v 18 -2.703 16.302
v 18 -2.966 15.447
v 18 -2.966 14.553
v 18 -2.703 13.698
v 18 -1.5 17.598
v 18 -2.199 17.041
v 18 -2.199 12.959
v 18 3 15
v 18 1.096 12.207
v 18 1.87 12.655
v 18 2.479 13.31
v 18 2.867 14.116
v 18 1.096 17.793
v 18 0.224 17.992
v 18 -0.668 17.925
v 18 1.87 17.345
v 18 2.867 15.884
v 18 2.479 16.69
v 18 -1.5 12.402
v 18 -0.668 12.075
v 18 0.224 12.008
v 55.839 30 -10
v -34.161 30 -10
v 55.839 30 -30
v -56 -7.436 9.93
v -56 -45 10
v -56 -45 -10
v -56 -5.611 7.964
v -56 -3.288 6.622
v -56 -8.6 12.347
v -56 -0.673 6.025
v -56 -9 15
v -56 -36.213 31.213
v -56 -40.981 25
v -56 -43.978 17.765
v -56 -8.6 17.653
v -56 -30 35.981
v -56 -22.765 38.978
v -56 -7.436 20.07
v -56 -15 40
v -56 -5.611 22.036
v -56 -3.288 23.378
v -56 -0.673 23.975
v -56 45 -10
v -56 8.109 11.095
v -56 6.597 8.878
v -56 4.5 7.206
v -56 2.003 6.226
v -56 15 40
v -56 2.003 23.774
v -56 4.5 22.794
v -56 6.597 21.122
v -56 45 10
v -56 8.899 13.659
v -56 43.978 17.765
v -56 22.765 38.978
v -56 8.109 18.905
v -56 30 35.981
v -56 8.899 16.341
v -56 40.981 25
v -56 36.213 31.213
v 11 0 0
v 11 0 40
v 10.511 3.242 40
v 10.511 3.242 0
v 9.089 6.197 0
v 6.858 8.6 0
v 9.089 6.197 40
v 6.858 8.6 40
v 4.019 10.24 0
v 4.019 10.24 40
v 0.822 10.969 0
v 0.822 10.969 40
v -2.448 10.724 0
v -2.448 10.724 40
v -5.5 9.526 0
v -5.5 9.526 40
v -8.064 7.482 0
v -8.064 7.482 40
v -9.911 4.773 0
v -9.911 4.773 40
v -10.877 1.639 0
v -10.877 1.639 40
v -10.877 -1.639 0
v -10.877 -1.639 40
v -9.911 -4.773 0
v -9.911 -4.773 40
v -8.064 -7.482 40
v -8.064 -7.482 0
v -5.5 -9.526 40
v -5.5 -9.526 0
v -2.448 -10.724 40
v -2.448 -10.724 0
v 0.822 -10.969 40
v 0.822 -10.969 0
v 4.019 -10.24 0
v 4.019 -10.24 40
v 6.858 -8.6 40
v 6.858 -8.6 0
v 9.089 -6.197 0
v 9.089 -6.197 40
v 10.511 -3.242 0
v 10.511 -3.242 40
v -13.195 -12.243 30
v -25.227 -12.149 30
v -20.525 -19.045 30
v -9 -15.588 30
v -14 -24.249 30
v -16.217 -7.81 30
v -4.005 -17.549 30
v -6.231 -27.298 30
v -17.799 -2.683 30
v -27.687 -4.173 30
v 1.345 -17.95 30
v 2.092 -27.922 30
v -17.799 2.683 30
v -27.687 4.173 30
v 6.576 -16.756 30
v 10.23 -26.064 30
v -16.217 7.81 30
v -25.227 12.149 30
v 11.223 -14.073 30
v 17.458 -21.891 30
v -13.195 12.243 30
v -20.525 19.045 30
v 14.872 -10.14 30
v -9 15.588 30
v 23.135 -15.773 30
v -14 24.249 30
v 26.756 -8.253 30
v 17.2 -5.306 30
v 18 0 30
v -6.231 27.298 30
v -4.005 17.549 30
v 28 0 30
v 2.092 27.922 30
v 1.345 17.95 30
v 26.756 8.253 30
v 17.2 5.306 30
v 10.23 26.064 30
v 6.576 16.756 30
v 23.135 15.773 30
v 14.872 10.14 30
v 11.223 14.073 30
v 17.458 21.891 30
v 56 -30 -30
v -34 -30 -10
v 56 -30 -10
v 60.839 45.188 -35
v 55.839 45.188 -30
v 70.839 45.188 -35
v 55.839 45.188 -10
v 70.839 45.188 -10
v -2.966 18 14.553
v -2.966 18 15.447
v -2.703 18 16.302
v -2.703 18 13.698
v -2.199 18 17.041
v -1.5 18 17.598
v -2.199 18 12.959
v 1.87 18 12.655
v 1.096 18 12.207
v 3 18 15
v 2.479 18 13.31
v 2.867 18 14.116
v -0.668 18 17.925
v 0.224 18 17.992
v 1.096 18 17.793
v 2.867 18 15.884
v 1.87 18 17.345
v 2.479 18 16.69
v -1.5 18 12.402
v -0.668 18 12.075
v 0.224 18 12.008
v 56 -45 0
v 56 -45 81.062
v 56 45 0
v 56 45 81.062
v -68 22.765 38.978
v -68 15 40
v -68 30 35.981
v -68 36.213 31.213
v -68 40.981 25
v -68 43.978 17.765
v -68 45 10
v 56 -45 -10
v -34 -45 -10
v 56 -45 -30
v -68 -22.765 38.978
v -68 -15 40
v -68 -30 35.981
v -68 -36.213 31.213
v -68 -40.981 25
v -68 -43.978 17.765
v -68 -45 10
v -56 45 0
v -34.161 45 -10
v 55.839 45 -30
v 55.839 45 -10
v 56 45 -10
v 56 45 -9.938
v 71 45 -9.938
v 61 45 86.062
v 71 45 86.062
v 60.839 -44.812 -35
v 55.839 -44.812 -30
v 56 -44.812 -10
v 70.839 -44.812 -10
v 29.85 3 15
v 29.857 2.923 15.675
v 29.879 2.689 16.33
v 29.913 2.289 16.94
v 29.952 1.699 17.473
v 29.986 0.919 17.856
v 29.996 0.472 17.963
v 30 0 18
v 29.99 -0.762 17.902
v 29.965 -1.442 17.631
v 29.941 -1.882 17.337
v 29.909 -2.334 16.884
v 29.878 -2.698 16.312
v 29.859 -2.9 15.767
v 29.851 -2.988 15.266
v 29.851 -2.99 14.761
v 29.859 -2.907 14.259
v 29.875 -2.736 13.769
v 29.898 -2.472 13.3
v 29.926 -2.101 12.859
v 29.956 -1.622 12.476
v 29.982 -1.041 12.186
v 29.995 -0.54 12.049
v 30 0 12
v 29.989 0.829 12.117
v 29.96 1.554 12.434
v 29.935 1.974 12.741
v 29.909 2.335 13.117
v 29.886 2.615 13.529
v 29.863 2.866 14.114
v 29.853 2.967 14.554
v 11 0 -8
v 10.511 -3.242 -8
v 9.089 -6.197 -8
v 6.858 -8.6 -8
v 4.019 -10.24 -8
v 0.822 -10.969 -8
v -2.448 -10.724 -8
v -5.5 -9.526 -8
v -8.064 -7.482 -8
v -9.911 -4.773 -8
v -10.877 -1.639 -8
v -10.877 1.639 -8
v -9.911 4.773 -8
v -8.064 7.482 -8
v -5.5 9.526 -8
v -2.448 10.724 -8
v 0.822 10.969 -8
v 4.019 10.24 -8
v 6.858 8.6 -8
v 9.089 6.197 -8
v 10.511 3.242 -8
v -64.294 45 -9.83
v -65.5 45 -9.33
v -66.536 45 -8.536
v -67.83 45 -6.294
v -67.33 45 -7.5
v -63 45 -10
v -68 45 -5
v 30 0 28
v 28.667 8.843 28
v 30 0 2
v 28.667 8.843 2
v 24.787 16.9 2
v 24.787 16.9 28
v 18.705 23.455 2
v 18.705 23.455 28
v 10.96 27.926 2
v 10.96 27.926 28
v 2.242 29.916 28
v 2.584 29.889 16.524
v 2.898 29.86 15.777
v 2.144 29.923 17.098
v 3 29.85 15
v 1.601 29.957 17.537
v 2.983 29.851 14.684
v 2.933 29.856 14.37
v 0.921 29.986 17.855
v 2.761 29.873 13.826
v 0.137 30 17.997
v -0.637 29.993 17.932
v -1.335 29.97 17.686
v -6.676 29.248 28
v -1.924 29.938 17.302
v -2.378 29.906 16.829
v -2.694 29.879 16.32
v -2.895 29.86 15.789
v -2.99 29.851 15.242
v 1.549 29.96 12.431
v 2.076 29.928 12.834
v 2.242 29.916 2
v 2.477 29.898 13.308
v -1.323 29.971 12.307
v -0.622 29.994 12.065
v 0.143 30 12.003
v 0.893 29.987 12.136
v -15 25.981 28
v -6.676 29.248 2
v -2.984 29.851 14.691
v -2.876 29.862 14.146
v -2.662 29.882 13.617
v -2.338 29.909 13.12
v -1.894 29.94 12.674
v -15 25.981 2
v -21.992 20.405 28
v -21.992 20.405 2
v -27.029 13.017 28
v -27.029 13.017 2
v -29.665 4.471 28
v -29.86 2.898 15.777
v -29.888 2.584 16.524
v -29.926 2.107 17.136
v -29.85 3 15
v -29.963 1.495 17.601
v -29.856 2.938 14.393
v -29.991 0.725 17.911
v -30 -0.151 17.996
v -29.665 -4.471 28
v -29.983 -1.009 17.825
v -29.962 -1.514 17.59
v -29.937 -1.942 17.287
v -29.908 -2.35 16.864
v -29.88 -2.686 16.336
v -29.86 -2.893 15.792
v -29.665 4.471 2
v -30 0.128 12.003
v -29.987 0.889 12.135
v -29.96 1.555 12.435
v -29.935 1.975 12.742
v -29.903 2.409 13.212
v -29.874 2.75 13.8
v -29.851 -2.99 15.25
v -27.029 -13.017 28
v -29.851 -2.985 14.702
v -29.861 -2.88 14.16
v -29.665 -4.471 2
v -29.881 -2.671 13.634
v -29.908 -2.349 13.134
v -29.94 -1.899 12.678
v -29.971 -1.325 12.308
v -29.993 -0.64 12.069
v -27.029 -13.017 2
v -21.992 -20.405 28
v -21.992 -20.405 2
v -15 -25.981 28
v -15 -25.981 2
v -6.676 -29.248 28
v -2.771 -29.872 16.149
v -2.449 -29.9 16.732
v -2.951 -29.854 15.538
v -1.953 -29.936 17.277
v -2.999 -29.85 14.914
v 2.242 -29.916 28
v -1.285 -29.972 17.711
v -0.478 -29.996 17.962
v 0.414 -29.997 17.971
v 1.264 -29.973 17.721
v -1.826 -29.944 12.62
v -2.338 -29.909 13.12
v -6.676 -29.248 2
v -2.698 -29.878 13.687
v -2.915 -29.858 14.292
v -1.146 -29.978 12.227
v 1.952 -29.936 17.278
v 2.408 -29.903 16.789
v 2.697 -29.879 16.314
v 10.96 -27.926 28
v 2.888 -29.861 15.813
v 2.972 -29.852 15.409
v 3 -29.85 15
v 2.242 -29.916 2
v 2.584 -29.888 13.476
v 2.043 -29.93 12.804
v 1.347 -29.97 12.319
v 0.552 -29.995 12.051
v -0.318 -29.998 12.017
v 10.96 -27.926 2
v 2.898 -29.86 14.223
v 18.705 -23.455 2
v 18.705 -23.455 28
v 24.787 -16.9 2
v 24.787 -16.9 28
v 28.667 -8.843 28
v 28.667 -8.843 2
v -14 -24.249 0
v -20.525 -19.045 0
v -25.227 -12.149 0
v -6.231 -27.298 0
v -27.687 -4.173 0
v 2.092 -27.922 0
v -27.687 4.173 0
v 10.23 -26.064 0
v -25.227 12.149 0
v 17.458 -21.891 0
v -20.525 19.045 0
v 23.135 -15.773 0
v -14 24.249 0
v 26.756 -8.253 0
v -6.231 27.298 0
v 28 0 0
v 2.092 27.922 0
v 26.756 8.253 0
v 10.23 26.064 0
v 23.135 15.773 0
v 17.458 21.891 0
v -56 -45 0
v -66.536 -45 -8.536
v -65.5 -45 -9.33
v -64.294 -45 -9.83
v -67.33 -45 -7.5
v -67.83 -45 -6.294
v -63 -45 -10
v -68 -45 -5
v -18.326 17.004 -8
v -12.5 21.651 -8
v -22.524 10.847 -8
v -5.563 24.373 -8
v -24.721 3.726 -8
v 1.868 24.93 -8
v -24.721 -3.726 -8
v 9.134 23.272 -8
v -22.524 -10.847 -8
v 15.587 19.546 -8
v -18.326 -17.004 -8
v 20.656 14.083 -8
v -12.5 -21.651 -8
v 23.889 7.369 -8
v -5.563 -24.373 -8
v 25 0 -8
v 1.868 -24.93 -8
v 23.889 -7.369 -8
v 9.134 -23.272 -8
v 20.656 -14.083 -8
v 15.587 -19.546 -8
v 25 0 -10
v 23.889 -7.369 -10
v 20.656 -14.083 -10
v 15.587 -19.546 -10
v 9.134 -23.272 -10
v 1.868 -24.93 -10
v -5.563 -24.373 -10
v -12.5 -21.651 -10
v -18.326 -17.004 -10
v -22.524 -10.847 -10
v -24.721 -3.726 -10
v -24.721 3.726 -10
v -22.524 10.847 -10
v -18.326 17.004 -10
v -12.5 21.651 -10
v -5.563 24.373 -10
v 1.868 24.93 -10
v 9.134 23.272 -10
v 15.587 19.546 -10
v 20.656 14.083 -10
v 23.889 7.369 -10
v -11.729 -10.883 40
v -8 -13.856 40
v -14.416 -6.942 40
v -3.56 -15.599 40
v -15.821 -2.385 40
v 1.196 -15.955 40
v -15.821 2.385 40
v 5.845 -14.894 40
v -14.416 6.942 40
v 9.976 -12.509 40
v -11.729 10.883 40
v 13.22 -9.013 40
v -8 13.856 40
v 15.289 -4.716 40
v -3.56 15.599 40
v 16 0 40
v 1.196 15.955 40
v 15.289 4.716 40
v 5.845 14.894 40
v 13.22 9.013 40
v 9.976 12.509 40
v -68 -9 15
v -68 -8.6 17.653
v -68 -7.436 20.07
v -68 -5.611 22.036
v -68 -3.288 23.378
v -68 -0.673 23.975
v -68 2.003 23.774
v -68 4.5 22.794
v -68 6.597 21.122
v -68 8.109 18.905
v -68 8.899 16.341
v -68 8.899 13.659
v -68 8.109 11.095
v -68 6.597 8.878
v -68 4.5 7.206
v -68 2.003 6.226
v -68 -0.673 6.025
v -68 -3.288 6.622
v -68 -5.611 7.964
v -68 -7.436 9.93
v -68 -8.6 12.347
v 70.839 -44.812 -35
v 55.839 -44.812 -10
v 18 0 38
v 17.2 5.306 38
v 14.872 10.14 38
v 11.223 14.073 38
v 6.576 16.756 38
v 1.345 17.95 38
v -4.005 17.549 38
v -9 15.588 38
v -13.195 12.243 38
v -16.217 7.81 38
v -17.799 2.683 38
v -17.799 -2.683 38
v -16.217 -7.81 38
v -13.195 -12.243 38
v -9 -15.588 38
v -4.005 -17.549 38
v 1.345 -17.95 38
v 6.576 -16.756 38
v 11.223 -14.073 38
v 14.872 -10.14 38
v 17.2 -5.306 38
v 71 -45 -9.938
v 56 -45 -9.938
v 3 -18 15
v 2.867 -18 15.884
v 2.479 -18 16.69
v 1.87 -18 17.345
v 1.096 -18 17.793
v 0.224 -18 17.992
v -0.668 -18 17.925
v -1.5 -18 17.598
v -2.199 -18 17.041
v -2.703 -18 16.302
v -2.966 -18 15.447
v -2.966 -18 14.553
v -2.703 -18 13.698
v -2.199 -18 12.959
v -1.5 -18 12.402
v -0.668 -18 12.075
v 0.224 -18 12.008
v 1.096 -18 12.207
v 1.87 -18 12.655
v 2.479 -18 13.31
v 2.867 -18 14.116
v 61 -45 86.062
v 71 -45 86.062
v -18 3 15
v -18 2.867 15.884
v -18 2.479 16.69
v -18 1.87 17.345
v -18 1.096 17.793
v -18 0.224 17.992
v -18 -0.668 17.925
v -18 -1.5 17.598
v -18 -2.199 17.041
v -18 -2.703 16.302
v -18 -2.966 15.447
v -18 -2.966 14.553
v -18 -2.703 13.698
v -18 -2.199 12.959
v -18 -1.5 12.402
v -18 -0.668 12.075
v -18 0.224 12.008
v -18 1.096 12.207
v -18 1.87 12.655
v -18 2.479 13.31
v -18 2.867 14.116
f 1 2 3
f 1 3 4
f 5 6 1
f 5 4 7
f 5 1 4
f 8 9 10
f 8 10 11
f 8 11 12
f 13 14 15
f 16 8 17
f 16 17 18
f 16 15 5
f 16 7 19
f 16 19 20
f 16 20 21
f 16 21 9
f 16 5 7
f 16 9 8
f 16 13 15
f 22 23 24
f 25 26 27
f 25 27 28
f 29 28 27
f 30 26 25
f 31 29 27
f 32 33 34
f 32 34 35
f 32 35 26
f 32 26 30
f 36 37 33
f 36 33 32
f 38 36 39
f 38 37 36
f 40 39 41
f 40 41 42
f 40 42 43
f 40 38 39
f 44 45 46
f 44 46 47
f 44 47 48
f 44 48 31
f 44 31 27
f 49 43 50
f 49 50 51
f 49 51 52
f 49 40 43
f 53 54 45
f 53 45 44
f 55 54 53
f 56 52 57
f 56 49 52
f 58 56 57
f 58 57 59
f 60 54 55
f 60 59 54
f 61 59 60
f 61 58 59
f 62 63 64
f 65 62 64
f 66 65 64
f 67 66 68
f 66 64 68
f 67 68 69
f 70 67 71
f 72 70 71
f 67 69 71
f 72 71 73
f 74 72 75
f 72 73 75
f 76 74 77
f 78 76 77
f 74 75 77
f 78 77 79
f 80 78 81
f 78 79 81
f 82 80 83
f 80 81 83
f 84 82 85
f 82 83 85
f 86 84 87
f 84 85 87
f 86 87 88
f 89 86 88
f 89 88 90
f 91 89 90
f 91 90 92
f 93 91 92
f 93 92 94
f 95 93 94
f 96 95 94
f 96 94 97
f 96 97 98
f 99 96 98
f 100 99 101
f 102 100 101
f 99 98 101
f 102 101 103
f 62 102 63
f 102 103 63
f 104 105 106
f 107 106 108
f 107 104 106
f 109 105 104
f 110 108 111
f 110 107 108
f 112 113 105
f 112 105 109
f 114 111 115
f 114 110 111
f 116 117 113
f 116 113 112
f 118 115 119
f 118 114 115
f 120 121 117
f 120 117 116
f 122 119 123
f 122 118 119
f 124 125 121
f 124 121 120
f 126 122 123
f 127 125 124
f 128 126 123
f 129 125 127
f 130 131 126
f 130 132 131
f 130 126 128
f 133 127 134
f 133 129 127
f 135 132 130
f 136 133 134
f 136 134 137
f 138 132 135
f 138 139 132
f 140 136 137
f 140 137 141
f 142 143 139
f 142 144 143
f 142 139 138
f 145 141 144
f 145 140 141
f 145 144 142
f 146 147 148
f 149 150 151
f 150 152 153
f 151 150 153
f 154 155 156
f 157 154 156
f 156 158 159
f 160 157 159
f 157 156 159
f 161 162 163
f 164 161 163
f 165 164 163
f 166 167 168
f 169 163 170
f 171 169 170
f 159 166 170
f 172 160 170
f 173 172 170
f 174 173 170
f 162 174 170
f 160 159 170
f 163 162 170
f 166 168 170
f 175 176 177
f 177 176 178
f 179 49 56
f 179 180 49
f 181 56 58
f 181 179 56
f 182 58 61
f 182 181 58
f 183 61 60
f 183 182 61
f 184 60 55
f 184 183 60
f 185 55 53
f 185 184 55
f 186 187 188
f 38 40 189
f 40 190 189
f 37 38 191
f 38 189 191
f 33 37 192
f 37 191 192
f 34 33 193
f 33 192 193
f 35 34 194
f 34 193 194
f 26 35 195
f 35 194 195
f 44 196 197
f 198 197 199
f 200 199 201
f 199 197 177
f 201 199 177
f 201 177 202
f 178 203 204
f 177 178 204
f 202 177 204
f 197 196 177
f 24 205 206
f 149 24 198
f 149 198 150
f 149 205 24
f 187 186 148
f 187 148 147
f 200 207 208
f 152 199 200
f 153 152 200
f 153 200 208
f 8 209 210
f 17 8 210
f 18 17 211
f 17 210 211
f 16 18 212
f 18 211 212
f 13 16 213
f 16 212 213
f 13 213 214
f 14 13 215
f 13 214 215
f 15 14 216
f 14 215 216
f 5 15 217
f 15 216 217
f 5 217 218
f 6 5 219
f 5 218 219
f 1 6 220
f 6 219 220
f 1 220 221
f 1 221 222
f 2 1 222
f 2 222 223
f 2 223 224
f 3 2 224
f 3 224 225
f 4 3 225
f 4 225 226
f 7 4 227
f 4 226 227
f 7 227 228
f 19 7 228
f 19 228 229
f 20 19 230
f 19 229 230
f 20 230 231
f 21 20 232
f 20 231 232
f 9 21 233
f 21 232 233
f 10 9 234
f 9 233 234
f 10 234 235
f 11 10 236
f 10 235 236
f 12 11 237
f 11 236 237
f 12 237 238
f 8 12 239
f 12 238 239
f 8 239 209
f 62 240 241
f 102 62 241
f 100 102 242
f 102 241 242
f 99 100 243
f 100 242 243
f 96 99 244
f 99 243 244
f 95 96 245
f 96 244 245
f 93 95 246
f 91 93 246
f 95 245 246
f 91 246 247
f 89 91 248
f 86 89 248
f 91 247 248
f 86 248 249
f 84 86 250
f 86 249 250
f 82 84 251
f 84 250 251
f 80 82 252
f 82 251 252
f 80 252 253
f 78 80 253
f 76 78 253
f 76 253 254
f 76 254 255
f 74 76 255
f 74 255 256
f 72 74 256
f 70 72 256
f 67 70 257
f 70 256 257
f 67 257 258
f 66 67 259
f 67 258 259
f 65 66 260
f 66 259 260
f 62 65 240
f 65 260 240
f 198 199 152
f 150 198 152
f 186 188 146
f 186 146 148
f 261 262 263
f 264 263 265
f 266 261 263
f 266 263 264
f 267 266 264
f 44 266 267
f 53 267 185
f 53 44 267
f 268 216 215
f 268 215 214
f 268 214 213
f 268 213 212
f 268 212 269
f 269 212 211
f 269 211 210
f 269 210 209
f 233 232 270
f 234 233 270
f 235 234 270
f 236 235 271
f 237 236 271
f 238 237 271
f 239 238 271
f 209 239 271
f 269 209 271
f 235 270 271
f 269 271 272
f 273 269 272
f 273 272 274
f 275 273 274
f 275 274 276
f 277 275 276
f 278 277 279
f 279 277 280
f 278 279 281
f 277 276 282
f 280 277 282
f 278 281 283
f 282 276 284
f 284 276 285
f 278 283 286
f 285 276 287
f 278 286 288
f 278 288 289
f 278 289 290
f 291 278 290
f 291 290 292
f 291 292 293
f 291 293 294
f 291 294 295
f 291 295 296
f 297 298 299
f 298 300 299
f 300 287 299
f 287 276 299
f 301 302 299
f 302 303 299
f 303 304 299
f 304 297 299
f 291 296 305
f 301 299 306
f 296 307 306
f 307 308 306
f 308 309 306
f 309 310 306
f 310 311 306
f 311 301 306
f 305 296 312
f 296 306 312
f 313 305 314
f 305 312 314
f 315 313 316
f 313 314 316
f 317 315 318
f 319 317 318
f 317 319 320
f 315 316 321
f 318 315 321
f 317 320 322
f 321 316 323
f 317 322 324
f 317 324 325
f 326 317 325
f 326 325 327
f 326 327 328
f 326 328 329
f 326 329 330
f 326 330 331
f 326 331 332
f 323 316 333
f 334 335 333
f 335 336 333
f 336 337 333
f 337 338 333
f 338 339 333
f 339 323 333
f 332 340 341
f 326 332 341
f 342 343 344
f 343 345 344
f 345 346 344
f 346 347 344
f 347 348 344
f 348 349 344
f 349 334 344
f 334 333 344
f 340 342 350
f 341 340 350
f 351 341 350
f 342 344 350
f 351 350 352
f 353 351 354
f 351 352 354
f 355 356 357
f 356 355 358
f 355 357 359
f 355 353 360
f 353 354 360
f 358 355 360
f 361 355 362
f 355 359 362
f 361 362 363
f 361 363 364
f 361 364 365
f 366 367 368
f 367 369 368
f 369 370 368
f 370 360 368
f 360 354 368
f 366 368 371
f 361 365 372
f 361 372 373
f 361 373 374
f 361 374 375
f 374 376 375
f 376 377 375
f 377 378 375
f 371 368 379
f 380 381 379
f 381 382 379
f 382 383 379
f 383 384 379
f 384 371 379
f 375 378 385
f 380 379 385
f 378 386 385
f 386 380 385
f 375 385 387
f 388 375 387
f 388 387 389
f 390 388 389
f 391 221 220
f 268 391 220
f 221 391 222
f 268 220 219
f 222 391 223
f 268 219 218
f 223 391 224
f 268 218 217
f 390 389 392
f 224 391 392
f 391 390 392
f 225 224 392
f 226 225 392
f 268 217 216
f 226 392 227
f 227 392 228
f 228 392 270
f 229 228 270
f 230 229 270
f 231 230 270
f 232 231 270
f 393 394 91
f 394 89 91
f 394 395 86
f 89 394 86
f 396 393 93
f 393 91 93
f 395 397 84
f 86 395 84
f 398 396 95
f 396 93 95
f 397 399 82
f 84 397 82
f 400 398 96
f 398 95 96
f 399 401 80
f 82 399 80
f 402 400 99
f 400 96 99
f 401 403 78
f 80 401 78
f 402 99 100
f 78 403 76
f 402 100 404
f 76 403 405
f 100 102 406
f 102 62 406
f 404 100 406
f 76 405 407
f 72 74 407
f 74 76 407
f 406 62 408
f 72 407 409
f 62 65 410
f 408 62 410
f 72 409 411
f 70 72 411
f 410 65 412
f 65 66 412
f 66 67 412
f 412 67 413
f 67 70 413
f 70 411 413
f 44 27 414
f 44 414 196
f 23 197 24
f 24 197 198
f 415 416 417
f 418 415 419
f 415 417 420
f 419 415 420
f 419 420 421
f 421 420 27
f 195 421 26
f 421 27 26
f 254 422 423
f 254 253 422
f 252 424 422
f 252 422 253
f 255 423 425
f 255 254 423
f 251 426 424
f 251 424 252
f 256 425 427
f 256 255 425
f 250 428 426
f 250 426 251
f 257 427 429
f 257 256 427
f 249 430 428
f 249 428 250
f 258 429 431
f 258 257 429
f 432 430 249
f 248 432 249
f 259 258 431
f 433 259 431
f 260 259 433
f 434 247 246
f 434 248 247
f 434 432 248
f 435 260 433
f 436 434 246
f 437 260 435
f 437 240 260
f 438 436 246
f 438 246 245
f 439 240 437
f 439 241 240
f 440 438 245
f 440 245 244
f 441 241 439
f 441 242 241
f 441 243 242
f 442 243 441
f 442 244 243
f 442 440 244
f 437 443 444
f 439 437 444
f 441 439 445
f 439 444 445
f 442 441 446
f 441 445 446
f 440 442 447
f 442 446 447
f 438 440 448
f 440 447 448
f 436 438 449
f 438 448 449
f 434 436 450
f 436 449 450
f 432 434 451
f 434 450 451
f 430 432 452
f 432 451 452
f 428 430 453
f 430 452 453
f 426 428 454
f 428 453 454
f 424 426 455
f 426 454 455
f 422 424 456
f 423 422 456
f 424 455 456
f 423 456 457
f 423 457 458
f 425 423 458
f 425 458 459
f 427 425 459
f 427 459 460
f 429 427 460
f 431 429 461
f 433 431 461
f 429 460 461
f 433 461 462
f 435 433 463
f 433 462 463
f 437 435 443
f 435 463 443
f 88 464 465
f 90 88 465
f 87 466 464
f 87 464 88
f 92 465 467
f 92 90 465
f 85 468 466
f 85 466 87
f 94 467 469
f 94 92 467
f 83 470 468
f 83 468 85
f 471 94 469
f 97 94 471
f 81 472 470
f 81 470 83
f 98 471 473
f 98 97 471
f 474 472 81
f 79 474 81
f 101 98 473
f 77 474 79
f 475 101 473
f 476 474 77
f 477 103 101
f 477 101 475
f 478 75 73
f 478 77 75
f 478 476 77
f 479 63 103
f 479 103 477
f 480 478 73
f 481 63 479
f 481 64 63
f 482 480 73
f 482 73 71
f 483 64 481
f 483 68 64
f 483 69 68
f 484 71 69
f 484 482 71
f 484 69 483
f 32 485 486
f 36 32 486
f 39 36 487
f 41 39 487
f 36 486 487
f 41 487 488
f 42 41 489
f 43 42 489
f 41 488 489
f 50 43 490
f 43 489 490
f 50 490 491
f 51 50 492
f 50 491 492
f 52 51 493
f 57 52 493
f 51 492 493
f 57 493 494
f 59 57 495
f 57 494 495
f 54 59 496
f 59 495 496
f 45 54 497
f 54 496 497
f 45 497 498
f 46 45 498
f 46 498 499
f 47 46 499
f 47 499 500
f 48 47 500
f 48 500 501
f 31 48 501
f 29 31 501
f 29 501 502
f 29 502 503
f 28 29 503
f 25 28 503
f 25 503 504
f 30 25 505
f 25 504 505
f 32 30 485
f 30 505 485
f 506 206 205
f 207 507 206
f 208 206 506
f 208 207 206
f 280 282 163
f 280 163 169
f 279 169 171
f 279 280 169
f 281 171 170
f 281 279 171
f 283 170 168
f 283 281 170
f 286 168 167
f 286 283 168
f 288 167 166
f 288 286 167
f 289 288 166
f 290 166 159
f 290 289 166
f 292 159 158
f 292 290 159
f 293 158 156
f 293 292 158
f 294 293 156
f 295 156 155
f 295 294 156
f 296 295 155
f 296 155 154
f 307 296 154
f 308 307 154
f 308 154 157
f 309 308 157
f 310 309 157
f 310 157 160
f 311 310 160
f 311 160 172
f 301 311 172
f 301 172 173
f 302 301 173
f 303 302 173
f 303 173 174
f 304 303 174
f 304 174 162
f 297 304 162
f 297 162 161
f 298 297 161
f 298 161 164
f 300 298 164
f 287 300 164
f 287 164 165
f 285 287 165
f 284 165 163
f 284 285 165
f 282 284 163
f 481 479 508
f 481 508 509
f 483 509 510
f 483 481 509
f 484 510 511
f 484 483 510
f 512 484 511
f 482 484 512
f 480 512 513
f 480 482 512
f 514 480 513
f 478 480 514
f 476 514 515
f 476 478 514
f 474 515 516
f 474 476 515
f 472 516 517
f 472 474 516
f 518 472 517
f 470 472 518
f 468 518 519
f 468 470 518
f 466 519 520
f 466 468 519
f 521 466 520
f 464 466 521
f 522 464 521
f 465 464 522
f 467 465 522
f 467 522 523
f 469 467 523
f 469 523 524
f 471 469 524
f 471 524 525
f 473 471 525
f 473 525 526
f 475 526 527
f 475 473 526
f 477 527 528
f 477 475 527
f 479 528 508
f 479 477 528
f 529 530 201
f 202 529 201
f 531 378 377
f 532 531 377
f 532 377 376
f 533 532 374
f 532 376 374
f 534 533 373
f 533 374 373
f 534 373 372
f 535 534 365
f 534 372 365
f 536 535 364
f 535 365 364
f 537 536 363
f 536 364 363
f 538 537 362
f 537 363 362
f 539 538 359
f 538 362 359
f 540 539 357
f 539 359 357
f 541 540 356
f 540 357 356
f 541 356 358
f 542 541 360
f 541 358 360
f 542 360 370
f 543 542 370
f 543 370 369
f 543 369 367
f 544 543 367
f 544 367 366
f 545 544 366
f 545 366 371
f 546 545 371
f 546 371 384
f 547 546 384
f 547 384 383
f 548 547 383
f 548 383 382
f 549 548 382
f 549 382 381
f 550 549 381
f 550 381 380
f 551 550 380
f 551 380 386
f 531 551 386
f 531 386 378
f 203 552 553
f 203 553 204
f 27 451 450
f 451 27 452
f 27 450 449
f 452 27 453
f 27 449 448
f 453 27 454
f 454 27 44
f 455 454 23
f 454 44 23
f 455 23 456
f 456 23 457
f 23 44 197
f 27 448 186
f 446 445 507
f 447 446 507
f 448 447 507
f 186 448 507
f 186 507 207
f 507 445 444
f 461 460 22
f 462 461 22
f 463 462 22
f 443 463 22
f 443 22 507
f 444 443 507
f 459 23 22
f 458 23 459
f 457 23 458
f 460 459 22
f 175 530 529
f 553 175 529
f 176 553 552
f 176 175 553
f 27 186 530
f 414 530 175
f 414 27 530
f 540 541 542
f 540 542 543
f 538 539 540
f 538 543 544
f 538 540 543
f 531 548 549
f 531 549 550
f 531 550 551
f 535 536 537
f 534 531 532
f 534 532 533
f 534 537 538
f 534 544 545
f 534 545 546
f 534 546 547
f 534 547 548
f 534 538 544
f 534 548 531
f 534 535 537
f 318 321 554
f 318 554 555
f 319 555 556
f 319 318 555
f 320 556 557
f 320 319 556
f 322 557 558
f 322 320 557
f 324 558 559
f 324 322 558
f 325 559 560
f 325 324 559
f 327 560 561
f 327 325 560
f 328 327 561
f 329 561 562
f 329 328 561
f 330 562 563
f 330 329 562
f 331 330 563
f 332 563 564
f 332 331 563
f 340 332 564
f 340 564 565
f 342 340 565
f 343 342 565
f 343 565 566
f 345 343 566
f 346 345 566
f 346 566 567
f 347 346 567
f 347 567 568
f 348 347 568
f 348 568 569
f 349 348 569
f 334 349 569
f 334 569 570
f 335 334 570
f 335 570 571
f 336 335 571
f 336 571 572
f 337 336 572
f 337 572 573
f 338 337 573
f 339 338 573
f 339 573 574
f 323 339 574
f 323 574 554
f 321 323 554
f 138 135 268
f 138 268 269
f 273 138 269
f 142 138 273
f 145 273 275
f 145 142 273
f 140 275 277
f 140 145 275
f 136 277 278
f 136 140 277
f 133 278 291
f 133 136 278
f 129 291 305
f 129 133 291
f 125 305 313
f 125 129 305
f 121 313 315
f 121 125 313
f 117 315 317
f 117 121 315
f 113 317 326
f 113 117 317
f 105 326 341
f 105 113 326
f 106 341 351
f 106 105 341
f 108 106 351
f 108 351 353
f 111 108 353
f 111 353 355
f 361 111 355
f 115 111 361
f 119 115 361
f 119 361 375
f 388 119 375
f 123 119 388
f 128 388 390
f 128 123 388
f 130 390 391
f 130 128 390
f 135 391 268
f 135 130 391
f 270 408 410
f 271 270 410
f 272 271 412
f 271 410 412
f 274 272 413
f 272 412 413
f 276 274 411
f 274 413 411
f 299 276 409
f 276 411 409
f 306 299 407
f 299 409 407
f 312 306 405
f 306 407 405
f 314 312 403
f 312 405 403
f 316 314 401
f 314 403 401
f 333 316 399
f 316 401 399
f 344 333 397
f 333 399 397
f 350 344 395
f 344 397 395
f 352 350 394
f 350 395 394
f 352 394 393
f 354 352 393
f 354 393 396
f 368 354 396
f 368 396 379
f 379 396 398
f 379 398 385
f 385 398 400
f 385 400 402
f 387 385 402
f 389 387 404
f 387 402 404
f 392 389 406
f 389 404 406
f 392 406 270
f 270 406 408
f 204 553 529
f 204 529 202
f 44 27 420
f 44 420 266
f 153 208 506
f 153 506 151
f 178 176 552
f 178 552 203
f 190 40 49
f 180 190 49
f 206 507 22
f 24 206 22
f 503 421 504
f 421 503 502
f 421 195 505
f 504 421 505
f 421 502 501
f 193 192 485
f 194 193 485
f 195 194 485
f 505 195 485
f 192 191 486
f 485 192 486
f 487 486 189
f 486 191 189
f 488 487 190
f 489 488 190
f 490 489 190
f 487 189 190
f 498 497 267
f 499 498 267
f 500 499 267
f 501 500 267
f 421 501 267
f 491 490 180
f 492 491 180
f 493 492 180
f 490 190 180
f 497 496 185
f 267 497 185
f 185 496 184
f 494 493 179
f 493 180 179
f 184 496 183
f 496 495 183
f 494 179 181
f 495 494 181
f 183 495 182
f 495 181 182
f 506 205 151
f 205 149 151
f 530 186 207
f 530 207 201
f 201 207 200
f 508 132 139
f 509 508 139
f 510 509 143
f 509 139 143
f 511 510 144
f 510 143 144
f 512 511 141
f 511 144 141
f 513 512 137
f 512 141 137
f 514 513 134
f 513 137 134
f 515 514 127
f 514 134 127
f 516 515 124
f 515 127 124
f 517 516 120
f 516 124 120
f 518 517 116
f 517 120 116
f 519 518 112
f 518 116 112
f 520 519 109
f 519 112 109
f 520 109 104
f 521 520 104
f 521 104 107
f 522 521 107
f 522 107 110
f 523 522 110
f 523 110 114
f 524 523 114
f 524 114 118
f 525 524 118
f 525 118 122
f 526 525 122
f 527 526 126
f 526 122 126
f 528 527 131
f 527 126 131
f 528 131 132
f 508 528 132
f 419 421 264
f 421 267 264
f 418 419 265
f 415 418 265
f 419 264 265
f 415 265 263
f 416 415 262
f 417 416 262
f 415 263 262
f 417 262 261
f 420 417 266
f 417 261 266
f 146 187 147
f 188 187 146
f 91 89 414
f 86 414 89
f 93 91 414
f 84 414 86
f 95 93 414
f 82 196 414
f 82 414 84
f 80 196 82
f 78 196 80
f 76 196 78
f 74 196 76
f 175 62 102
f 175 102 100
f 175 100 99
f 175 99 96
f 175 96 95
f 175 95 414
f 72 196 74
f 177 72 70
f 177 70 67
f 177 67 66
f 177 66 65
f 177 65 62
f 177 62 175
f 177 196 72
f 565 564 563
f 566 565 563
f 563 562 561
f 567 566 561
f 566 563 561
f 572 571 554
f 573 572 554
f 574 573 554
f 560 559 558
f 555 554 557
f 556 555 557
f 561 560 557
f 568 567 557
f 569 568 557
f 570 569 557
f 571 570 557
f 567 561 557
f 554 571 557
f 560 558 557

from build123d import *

# Parameters (mm, degrees)
F0_R      = 30
F1_DEPTH  = 30
F2_R      = 18
F3_DEPTH  = 10
F4_SIZE   = 2
F5_R      = 11
F6_DEPTH  = 40
F8_R      = 3
F9_DEPTH  = 12
F11_R     = 3
F12_DEPTH = 12
F15_R     = 3
F16_DEPTH = 12
F17_R     = 3
F18_DEPTH = 12
F20_W     = 90
F20_H     = 50
F21_DEPTH = 12
F22_R     = 9
F23_DEPTH = 12
F25_W     = 112
F25_H     = 90
F26_DEPTH = 10
F27_R     = 25
F28_DEPTH = 2
F29_R     = 11
F30_DEPTH = 8
F31_R     = 30
F32_R     = 30
F35_W     = 15
F35_H     = 90
F36_DEPTH = 25
F34_W     = 90
F34_H     = 96
F37_DEPTH = 15
F38_SIZE  = 5
F39_SIZE  = 5
F40_R     = 5
F44_DEPTH = 15
F46_DEPTH = 15


with BuildPart() as f1:
    # F0 (on Top) → F1 (new body)
    with BuildSketch(Plane.XY):
        Circle(F0_R)
    extrude(amount=F1_DEPTH)

    # F2 (on face) → F3 (join)
    with BuildSketch(Plane.XY.offset(30)):
        Circle(F2_R)
    extrude(amount=F3_DEPTH)

    # F4
    f4_edges = [f1.edges().sort_by_distance(p)[0] for p in [
        (-18, 0, 40),
        (-30, 0, 30),
        (-30, 0, 0),
    ]]
    chamfer(f4_edges, length=F4_SIZE)

    # F5 (on face) → F6 (cut)
    with BuildSketch(Plane.XY.offset(40)):
        Circle(F5_R)
    extrude(amount=-F6_DEPTH, mode=Mode.SUBTRACT)

    # F8 (on offset) → F9 (cut)
    with BuildSketch(Plane.YZ.offset(30)):
        with Locations((0, 15)):
            Circle(F8_R)
    extrude(amount=-F9_DEPTH, mode=Mode.SUBTRACT)

    # F11 (on offset) → F12 (cut)
    with BuildSketch(Plane.YZ.offset(-30)):
        with Locations((0, 15)):
            Circle(F11_R)
    extrude(amount=F12_DEPTH, mode=Mode.SUBTRACT)

    # F15 (on offset) → F16 (cut)
    with BuildSketch(Plane.XZ.offset(30)):
        with Locations((0, 15)):
            Circle(F15_R)
    extrude(amount=-F16_DEPTH, mode=Mode.SUBTRACT)

    # F17 (on offset) → F18 (cut)
    with BuildSketch(Plane.XZ.offset(-30)):
        with Locations((0, 15)):
            Circle(F17_R)
    extrude(amount=F18_DEPTH, mode=Mode.SUBTRACT)


with BuildPart() as f21:
    # F20 (on offset) → F21 (new body)
    with BuildSketch(Plane.YZ.offset(-56)):
        with Locations((0, 15)):
            Rectangle(F20_W, F20_H)
    extrude(amount=-F21_DEPTH)

    # F22 (on face) → F23 (cut)
    with BuildSketch(Plane(origin=(-68, 0, 0), x_dir=(0, -1, 0), z_dir=(-1, 0, 0))):
        with Locations((0, 15)):
            Circle(F22_R)
    extrude(amount=-F23_DEPTH, mode=Mode.SUBTRACT)

    # F31
    f31_edges = [f21.edges().sort_by_distance(p)[0] for p in [
        (-62, 45, 40),
    ]]
    fillet(f31_edges, radius=F31_R)

    # F32
    f32_edges = [f21.edges().sort_by_distance(p)[0] for p in [
        (-62, -45, 40),
    ]]
    fillet(f32_edges, radius=F32_R)

    # F40
    f40_edges = [f21.edges().sort_by_distance(p)[0] for p in [
        (-68, 0, -10),
    ]]
    fillet(f40_edges, radius=F40_R)


with BuildPart() as f26:
    # F25 (on offset) → F26 (new body)
    with BuildSketch(Plane.XY.offset(-10)):
        Rectangle(F25_W, F25_H)
    extrude(amount=F26_DEPTH)

    # F27 (on face) → F28 (cut)
    with BuildSketch(Plane(origin=(0, 0, -10), x_dir=(1, 0, 0), z_dir=(0, 0, -1))):
        Circle(F27_R)
    extrude(amount=-F28_DEPTH, mode=Mode.SUBTRACT)

    # F29 (on face) → F30 (cut)
    with BuildSketch(Plane(origin=(0, 0, -8), x_dir=(1, 0, 0), z_dir=(0, 0, -1))):
        Circle(F29_R)
    extrude(amount=-F30_DEPTH, mode=Mode.SUBTRACT)

    # F35 (on offset) → F36 (join)
    with BuildSketch(Plane.XY.offset(-10)):
        with Locations((63.33898, 0.187946)):
            Rectangle(F35_W, F35_H)
    extrude(amount=-F36_DEPTH)

    # F34 (on offset) → F37 (join)
    with BuildSketch(Plane.YZ.offset(56)):
        with Locations((0, 38.062497)):
            Rectangle(F34_W, F34_H)
    extrude(amount=F37_DEPTH)

    # F38
    f38_edges = [f26.edges().sort_by_distance(p)[0] for p in [
        (56, 0, 86.062497),
    ]]
    chamfer(f38_edges, length=F38_SIZE)

    # F39
    f39_edges = [f26.edges().sort_by_distance(p)[0] for p in [
        (55.83898, 0.187946, -35),
    ]]
    chamfer(f39_edges, length=F39_SIZE)

    # F43 (on offset) → F44 (join)
    with BuildSketch(Plane.XZ.offset(-45)):
        Polygon((55.83898, -30), (55.83898, -10), (-34.16102, -10), align=None)
    extrude(amount=F44_DEPTH)


with BuildPart() as f46:
    # F45 (on offset) → F46 (new body)
    with BuildSketch(Plane.XZ.offset(45)):
        Polygon((56, -30), (56, -10), (-34, -10), align=None)
    extrude(amount=-F46_DEPTH)


solid = Compound([f1.part, f21.part, f26.part, f46.part])
